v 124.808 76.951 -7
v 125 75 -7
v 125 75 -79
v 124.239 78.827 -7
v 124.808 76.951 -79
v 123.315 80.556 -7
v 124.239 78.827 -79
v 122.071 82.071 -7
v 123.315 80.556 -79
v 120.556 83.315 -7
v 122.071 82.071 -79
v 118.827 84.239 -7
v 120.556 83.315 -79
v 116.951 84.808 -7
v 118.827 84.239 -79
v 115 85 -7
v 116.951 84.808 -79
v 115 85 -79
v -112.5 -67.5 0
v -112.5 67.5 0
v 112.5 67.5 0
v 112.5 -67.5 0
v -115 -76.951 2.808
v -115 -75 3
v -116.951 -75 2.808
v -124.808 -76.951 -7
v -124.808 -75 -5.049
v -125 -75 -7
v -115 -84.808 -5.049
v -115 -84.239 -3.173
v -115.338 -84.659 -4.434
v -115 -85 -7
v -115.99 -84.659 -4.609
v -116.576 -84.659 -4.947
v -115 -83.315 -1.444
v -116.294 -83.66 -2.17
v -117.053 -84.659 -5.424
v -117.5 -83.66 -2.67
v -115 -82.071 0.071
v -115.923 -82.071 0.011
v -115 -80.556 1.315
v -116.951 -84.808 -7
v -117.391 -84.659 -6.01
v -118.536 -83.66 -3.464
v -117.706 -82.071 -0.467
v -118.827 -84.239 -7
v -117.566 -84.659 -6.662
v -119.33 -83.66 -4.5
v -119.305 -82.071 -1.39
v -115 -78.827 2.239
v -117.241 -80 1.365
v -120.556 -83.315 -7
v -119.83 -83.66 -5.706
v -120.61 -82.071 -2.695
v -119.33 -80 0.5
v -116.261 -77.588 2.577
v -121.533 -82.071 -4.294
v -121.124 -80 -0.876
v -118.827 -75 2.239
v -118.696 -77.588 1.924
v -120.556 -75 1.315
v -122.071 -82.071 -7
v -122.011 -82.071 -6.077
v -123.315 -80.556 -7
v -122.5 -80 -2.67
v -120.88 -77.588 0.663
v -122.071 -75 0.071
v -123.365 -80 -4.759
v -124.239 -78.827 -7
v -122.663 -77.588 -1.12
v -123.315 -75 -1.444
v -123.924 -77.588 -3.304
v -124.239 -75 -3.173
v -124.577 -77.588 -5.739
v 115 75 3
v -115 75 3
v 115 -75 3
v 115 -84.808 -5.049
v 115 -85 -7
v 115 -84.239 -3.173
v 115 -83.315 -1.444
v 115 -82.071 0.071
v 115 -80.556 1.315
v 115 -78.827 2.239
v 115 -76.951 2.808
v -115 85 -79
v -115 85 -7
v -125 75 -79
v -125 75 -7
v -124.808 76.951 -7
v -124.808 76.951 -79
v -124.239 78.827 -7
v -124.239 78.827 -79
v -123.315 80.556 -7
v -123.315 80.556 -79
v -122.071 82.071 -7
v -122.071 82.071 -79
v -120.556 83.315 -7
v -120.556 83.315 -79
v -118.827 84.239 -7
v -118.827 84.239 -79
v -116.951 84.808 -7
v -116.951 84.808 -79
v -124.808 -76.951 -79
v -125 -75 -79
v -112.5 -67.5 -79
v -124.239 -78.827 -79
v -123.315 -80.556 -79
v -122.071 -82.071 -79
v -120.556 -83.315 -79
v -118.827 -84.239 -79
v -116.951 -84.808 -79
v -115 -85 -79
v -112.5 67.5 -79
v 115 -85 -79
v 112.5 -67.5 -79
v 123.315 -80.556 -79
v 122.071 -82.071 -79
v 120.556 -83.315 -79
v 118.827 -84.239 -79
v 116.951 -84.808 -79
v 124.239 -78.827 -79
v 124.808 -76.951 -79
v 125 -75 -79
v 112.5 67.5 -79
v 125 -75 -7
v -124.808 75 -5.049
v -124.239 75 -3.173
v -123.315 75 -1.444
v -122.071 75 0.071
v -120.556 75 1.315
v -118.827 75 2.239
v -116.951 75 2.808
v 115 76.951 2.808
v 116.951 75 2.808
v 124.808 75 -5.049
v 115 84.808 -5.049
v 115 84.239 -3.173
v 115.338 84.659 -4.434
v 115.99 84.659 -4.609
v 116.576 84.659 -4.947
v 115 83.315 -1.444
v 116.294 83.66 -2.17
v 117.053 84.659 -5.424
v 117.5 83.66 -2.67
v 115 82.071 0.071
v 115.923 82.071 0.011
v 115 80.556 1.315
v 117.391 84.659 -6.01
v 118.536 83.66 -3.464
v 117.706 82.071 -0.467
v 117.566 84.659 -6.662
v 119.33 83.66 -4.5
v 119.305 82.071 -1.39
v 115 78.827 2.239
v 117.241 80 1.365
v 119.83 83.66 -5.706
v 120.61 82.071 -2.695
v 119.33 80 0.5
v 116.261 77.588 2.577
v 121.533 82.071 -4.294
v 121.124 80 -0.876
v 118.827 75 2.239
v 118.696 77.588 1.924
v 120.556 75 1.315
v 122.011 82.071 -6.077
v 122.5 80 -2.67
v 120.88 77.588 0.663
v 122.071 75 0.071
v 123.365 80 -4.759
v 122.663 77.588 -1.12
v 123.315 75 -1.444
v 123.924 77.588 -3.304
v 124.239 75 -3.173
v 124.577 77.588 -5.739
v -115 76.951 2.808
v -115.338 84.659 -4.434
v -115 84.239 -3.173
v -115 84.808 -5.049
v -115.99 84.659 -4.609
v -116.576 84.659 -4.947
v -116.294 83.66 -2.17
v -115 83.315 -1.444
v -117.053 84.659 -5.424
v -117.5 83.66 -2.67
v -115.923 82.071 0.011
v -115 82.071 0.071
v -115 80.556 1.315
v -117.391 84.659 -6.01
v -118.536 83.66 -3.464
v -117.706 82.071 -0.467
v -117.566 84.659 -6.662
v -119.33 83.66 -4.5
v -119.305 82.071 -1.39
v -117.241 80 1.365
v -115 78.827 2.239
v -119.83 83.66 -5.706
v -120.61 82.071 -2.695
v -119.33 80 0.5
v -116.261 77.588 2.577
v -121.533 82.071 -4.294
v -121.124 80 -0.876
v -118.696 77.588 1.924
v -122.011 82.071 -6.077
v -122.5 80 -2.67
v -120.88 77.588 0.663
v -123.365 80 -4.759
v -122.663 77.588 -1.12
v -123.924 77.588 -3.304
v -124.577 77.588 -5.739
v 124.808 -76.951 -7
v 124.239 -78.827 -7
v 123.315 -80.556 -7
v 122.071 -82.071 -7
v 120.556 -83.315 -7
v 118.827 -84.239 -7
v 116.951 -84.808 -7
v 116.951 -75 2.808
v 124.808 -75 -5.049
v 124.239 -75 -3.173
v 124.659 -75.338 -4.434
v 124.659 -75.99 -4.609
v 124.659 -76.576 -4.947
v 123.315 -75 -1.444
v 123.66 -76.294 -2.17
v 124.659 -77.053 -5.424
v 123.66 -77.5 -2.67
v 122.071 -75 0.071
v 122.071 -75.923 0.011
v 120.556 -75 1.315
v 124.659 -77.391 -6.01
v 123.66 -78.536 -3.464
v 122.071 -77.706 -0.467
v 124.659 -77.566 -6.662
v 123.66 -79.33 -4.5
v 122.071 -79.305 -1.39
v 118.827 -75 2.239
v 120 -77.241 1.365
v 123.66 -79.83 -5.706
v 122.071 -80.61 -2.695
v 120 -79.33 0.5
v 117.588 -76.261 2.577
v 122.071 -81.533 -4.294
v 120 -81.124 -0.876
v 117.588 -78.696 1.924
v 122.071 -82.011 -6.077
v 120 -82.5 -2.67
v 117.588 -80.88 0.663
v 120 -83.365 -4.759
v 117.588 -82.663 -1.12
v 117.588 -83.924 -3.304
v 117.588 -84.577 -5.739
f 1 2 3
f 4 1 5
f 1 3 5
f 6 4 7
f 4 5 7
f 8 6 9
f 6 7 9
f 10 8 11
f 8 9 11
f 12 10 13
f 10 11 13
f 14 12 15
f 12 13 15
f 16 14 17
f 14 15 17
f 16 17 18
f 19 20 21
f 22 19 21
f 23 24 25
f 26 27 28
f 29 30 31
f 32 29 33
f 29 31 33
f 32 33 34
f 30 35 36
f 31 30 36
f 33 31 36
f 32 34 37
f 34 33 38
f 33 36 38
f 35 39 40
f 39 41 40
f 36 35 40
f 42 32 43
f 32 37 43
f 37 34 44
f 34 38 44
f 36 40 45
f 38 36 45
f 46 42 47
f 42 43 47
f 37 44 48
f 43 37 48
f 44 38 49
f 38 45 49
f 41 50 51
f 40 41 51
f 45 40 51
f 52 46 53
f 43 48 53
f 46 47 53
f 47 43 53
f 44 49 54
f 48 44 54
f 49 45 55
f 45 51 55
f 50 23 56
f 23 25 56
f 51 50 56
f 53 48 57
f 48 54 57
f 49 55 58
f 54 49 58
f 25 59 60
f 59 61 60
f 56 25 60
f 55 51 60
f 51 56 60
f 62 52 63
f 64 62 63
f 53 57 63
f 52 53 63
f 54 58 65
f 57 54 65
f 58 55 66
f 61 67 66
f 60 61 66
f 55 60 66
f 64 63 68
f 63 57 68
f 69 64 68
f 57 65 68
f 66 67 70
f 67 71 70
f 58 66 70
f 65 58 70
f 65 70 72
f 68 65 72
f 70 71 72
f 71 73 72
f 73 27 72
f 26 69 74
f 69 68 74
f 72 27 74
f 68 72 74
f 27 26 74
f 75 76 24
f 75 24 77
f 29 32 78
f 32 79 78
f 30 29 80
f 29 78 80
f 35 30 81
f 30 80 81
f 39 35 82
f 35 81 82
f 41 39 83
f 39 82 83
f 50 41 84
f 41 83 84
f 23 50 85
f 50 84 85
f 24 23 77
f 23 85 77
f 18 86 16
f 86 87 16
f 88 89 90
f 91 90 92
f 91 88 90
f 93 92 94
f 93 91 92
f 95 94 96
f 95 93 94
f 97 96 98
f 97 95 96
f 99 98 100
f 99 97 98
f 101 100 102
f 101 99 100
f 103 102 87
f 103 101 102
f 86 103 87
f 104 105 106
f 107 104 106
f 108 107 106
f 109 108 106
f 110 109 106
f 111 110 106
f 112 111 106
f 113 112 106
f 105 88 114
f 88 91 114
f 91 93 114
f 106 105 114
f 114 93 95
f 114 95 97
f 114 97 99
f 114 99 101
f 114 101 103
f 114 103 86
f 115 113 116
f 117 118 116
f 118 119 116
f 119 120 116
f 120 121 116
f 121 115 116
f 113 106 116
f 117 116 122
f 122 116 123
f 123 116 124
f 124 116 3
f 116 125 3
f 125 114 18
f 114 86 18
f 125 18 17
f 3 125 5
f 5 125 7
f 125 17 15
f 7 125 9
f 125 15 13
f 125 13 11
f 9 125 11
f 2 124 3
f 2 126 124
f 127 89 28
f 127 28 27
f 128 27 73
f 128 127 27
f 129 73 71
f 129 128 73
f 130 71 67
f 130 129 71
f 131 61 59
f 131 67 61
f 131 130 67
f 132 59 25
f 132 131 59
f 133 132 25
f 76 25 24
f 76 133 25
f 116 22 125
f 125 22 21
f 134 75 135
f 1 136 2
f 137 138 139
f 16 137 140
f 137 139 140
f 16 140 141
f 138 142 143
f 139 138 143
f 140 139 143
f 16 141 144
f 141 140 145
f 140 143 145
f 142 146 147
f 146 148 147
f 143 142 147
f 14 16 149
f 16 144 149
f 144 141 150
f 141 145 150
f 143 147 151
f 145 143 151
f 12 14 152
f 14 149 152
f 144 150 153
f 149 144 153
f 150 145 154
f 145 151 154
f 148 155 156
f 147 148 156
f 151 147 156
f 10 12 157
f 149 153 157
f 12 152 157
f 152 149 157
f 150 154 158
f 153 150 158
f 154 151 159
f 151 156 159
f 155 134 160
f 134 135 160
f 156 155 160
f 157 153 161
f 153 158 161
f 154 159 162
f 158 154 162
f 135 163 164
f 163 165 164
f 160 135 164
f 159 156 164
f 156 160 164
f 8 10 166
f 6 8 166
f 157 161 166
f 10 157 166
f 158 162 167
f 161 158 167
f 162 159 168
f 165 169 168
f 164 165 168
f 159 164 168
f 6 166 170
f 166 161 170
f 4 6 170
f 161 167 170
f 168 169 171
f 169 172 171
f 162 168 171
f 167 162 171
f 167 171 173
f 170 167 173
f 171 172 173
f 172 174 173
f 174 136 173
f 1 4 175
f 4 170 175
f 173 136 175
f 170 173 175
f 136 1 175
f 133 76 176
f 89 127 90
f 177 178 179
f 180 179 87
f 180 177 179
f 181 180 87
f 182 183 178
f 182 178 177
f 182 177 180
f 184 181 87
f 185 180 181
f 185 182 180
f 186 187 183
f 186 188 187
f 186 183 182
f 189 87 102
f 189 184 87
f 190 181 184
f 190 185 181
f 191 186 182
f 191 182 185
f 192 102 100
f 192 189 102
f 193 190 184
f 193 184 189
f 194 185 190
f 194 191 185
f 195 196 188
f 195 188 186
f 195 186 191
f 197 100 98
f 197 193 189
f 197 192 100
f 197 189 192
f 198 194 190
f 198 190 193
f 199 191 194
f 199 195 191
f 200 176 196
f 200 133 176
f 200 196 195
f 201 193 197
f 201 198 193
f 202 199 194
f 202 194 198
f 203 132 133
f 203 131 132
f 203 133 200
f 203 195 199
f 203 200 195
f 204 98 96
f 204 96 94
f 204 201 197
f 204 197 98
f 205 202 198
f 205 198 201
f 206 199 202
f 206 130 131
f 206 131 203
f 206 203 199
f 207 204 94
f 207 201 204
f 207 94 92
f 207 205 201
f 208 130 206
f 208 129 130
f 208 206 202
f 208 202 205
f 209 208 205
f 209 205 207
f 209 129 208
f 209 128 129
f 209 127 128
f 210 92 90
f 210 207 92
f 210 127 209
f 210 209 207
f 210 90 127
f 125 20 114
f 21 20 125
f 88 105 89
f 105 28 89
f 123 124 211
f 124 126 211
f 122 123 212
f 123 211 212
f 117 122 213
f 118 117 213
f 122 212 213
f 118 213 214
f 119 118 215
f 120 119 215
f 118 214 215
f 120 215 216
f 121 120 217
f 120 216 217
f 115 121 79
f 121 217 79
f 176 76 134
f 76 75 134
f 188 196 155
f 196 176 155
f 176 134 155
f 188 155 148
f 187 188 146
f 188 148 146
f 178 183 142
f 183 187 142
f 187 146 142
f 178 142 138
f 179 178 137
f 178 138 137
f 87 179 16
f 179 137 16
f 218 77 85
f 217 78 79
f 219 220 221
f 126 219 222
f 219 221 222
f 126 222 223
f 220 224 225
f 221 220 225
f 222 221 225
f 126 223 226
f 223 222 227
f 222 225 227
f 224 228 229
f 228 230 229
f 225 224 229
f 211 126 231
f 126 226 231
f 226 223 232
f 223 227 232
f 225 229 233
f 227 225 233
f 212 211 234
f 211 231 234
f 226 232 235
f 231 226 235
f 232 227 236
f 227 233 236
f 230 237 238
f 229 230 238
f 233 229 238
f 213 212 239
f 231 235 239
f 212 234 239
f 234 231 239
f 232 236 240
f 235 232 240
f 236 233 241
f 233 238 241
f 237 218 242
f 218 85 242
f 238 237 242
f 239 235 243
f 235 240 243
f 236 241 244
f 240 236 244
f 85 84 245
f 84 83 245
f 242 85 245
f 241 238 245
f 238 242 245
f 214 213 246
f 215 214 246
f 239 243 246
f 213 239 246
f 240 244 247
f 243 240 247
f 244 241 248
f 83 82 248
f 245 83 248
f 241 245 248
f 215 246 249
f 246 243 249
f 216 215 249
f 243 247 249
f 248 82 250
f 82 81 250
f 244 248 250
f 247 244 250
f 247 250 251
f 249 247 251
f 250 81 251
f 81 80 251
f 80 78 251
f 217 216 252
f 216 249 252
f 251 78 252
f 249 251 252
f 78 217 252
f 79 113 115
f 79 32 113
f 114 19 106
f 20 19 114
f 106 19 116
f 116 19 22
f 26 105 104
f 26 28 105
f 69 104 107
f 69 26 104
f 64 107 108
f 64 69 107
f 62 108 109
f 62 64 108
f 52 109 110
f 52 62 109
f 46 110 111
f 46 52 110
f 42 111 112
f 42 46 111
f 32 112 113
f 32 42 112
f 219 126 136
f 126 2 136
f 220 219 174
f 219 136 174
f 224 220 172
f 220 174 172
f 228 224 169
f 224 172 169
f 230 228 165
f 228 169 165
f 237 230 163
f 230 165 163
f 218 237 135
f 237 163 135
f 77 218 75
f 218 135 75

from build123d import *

# Parameters (mm, degrees)
F0_W     = 250
F0_H     = 170
F0_W_2   = 235
F0_H_2   = 150
F1_DEPTH = 3
F2_W     = 250
F2_H     = 170
F2_W_2   = 225
F2_H_2   = 135
F3_DEPTH = 82
F4_R     = 10


with BuildPart() as f1:
    # F0 (on Top) → F1 (new body)
    with BuildSketch(Plane.XY):
        Rectangle(F0_W, F0_H)
        Rectangle(F0_W_2, F0_H_2, mode=Mode.SUBTRACT)
        Rectangle(F0_W_2, F0_H_2)
    extrude(amount=F1_DEPTH)

    # F2 (on face) → F3 (join)
    with BuildSketch(Plane.XY.offset(3)):
        Rectangle(F2_W, F2_H)
        Rectangle(F2_W_2, F2_H_2, mode=Mode.SUBTRACT)
    extrude(amount=-F3_DEPTH)

    # F4
    f4_edges = [f1.edges().sort_by_distance(p)[0] for p in [
        (-125, 0, 3),
        (0, -85, 3),
        (125, 0, 3),
        (0, 85, 3),
        (125, -85, -38),
        (125, 85, -38),
        (-125, -85, -38),
        (-125, 85, -38),
    ]]
    fillet(f4_edges, radius=F4_R)


solid = f1.part
